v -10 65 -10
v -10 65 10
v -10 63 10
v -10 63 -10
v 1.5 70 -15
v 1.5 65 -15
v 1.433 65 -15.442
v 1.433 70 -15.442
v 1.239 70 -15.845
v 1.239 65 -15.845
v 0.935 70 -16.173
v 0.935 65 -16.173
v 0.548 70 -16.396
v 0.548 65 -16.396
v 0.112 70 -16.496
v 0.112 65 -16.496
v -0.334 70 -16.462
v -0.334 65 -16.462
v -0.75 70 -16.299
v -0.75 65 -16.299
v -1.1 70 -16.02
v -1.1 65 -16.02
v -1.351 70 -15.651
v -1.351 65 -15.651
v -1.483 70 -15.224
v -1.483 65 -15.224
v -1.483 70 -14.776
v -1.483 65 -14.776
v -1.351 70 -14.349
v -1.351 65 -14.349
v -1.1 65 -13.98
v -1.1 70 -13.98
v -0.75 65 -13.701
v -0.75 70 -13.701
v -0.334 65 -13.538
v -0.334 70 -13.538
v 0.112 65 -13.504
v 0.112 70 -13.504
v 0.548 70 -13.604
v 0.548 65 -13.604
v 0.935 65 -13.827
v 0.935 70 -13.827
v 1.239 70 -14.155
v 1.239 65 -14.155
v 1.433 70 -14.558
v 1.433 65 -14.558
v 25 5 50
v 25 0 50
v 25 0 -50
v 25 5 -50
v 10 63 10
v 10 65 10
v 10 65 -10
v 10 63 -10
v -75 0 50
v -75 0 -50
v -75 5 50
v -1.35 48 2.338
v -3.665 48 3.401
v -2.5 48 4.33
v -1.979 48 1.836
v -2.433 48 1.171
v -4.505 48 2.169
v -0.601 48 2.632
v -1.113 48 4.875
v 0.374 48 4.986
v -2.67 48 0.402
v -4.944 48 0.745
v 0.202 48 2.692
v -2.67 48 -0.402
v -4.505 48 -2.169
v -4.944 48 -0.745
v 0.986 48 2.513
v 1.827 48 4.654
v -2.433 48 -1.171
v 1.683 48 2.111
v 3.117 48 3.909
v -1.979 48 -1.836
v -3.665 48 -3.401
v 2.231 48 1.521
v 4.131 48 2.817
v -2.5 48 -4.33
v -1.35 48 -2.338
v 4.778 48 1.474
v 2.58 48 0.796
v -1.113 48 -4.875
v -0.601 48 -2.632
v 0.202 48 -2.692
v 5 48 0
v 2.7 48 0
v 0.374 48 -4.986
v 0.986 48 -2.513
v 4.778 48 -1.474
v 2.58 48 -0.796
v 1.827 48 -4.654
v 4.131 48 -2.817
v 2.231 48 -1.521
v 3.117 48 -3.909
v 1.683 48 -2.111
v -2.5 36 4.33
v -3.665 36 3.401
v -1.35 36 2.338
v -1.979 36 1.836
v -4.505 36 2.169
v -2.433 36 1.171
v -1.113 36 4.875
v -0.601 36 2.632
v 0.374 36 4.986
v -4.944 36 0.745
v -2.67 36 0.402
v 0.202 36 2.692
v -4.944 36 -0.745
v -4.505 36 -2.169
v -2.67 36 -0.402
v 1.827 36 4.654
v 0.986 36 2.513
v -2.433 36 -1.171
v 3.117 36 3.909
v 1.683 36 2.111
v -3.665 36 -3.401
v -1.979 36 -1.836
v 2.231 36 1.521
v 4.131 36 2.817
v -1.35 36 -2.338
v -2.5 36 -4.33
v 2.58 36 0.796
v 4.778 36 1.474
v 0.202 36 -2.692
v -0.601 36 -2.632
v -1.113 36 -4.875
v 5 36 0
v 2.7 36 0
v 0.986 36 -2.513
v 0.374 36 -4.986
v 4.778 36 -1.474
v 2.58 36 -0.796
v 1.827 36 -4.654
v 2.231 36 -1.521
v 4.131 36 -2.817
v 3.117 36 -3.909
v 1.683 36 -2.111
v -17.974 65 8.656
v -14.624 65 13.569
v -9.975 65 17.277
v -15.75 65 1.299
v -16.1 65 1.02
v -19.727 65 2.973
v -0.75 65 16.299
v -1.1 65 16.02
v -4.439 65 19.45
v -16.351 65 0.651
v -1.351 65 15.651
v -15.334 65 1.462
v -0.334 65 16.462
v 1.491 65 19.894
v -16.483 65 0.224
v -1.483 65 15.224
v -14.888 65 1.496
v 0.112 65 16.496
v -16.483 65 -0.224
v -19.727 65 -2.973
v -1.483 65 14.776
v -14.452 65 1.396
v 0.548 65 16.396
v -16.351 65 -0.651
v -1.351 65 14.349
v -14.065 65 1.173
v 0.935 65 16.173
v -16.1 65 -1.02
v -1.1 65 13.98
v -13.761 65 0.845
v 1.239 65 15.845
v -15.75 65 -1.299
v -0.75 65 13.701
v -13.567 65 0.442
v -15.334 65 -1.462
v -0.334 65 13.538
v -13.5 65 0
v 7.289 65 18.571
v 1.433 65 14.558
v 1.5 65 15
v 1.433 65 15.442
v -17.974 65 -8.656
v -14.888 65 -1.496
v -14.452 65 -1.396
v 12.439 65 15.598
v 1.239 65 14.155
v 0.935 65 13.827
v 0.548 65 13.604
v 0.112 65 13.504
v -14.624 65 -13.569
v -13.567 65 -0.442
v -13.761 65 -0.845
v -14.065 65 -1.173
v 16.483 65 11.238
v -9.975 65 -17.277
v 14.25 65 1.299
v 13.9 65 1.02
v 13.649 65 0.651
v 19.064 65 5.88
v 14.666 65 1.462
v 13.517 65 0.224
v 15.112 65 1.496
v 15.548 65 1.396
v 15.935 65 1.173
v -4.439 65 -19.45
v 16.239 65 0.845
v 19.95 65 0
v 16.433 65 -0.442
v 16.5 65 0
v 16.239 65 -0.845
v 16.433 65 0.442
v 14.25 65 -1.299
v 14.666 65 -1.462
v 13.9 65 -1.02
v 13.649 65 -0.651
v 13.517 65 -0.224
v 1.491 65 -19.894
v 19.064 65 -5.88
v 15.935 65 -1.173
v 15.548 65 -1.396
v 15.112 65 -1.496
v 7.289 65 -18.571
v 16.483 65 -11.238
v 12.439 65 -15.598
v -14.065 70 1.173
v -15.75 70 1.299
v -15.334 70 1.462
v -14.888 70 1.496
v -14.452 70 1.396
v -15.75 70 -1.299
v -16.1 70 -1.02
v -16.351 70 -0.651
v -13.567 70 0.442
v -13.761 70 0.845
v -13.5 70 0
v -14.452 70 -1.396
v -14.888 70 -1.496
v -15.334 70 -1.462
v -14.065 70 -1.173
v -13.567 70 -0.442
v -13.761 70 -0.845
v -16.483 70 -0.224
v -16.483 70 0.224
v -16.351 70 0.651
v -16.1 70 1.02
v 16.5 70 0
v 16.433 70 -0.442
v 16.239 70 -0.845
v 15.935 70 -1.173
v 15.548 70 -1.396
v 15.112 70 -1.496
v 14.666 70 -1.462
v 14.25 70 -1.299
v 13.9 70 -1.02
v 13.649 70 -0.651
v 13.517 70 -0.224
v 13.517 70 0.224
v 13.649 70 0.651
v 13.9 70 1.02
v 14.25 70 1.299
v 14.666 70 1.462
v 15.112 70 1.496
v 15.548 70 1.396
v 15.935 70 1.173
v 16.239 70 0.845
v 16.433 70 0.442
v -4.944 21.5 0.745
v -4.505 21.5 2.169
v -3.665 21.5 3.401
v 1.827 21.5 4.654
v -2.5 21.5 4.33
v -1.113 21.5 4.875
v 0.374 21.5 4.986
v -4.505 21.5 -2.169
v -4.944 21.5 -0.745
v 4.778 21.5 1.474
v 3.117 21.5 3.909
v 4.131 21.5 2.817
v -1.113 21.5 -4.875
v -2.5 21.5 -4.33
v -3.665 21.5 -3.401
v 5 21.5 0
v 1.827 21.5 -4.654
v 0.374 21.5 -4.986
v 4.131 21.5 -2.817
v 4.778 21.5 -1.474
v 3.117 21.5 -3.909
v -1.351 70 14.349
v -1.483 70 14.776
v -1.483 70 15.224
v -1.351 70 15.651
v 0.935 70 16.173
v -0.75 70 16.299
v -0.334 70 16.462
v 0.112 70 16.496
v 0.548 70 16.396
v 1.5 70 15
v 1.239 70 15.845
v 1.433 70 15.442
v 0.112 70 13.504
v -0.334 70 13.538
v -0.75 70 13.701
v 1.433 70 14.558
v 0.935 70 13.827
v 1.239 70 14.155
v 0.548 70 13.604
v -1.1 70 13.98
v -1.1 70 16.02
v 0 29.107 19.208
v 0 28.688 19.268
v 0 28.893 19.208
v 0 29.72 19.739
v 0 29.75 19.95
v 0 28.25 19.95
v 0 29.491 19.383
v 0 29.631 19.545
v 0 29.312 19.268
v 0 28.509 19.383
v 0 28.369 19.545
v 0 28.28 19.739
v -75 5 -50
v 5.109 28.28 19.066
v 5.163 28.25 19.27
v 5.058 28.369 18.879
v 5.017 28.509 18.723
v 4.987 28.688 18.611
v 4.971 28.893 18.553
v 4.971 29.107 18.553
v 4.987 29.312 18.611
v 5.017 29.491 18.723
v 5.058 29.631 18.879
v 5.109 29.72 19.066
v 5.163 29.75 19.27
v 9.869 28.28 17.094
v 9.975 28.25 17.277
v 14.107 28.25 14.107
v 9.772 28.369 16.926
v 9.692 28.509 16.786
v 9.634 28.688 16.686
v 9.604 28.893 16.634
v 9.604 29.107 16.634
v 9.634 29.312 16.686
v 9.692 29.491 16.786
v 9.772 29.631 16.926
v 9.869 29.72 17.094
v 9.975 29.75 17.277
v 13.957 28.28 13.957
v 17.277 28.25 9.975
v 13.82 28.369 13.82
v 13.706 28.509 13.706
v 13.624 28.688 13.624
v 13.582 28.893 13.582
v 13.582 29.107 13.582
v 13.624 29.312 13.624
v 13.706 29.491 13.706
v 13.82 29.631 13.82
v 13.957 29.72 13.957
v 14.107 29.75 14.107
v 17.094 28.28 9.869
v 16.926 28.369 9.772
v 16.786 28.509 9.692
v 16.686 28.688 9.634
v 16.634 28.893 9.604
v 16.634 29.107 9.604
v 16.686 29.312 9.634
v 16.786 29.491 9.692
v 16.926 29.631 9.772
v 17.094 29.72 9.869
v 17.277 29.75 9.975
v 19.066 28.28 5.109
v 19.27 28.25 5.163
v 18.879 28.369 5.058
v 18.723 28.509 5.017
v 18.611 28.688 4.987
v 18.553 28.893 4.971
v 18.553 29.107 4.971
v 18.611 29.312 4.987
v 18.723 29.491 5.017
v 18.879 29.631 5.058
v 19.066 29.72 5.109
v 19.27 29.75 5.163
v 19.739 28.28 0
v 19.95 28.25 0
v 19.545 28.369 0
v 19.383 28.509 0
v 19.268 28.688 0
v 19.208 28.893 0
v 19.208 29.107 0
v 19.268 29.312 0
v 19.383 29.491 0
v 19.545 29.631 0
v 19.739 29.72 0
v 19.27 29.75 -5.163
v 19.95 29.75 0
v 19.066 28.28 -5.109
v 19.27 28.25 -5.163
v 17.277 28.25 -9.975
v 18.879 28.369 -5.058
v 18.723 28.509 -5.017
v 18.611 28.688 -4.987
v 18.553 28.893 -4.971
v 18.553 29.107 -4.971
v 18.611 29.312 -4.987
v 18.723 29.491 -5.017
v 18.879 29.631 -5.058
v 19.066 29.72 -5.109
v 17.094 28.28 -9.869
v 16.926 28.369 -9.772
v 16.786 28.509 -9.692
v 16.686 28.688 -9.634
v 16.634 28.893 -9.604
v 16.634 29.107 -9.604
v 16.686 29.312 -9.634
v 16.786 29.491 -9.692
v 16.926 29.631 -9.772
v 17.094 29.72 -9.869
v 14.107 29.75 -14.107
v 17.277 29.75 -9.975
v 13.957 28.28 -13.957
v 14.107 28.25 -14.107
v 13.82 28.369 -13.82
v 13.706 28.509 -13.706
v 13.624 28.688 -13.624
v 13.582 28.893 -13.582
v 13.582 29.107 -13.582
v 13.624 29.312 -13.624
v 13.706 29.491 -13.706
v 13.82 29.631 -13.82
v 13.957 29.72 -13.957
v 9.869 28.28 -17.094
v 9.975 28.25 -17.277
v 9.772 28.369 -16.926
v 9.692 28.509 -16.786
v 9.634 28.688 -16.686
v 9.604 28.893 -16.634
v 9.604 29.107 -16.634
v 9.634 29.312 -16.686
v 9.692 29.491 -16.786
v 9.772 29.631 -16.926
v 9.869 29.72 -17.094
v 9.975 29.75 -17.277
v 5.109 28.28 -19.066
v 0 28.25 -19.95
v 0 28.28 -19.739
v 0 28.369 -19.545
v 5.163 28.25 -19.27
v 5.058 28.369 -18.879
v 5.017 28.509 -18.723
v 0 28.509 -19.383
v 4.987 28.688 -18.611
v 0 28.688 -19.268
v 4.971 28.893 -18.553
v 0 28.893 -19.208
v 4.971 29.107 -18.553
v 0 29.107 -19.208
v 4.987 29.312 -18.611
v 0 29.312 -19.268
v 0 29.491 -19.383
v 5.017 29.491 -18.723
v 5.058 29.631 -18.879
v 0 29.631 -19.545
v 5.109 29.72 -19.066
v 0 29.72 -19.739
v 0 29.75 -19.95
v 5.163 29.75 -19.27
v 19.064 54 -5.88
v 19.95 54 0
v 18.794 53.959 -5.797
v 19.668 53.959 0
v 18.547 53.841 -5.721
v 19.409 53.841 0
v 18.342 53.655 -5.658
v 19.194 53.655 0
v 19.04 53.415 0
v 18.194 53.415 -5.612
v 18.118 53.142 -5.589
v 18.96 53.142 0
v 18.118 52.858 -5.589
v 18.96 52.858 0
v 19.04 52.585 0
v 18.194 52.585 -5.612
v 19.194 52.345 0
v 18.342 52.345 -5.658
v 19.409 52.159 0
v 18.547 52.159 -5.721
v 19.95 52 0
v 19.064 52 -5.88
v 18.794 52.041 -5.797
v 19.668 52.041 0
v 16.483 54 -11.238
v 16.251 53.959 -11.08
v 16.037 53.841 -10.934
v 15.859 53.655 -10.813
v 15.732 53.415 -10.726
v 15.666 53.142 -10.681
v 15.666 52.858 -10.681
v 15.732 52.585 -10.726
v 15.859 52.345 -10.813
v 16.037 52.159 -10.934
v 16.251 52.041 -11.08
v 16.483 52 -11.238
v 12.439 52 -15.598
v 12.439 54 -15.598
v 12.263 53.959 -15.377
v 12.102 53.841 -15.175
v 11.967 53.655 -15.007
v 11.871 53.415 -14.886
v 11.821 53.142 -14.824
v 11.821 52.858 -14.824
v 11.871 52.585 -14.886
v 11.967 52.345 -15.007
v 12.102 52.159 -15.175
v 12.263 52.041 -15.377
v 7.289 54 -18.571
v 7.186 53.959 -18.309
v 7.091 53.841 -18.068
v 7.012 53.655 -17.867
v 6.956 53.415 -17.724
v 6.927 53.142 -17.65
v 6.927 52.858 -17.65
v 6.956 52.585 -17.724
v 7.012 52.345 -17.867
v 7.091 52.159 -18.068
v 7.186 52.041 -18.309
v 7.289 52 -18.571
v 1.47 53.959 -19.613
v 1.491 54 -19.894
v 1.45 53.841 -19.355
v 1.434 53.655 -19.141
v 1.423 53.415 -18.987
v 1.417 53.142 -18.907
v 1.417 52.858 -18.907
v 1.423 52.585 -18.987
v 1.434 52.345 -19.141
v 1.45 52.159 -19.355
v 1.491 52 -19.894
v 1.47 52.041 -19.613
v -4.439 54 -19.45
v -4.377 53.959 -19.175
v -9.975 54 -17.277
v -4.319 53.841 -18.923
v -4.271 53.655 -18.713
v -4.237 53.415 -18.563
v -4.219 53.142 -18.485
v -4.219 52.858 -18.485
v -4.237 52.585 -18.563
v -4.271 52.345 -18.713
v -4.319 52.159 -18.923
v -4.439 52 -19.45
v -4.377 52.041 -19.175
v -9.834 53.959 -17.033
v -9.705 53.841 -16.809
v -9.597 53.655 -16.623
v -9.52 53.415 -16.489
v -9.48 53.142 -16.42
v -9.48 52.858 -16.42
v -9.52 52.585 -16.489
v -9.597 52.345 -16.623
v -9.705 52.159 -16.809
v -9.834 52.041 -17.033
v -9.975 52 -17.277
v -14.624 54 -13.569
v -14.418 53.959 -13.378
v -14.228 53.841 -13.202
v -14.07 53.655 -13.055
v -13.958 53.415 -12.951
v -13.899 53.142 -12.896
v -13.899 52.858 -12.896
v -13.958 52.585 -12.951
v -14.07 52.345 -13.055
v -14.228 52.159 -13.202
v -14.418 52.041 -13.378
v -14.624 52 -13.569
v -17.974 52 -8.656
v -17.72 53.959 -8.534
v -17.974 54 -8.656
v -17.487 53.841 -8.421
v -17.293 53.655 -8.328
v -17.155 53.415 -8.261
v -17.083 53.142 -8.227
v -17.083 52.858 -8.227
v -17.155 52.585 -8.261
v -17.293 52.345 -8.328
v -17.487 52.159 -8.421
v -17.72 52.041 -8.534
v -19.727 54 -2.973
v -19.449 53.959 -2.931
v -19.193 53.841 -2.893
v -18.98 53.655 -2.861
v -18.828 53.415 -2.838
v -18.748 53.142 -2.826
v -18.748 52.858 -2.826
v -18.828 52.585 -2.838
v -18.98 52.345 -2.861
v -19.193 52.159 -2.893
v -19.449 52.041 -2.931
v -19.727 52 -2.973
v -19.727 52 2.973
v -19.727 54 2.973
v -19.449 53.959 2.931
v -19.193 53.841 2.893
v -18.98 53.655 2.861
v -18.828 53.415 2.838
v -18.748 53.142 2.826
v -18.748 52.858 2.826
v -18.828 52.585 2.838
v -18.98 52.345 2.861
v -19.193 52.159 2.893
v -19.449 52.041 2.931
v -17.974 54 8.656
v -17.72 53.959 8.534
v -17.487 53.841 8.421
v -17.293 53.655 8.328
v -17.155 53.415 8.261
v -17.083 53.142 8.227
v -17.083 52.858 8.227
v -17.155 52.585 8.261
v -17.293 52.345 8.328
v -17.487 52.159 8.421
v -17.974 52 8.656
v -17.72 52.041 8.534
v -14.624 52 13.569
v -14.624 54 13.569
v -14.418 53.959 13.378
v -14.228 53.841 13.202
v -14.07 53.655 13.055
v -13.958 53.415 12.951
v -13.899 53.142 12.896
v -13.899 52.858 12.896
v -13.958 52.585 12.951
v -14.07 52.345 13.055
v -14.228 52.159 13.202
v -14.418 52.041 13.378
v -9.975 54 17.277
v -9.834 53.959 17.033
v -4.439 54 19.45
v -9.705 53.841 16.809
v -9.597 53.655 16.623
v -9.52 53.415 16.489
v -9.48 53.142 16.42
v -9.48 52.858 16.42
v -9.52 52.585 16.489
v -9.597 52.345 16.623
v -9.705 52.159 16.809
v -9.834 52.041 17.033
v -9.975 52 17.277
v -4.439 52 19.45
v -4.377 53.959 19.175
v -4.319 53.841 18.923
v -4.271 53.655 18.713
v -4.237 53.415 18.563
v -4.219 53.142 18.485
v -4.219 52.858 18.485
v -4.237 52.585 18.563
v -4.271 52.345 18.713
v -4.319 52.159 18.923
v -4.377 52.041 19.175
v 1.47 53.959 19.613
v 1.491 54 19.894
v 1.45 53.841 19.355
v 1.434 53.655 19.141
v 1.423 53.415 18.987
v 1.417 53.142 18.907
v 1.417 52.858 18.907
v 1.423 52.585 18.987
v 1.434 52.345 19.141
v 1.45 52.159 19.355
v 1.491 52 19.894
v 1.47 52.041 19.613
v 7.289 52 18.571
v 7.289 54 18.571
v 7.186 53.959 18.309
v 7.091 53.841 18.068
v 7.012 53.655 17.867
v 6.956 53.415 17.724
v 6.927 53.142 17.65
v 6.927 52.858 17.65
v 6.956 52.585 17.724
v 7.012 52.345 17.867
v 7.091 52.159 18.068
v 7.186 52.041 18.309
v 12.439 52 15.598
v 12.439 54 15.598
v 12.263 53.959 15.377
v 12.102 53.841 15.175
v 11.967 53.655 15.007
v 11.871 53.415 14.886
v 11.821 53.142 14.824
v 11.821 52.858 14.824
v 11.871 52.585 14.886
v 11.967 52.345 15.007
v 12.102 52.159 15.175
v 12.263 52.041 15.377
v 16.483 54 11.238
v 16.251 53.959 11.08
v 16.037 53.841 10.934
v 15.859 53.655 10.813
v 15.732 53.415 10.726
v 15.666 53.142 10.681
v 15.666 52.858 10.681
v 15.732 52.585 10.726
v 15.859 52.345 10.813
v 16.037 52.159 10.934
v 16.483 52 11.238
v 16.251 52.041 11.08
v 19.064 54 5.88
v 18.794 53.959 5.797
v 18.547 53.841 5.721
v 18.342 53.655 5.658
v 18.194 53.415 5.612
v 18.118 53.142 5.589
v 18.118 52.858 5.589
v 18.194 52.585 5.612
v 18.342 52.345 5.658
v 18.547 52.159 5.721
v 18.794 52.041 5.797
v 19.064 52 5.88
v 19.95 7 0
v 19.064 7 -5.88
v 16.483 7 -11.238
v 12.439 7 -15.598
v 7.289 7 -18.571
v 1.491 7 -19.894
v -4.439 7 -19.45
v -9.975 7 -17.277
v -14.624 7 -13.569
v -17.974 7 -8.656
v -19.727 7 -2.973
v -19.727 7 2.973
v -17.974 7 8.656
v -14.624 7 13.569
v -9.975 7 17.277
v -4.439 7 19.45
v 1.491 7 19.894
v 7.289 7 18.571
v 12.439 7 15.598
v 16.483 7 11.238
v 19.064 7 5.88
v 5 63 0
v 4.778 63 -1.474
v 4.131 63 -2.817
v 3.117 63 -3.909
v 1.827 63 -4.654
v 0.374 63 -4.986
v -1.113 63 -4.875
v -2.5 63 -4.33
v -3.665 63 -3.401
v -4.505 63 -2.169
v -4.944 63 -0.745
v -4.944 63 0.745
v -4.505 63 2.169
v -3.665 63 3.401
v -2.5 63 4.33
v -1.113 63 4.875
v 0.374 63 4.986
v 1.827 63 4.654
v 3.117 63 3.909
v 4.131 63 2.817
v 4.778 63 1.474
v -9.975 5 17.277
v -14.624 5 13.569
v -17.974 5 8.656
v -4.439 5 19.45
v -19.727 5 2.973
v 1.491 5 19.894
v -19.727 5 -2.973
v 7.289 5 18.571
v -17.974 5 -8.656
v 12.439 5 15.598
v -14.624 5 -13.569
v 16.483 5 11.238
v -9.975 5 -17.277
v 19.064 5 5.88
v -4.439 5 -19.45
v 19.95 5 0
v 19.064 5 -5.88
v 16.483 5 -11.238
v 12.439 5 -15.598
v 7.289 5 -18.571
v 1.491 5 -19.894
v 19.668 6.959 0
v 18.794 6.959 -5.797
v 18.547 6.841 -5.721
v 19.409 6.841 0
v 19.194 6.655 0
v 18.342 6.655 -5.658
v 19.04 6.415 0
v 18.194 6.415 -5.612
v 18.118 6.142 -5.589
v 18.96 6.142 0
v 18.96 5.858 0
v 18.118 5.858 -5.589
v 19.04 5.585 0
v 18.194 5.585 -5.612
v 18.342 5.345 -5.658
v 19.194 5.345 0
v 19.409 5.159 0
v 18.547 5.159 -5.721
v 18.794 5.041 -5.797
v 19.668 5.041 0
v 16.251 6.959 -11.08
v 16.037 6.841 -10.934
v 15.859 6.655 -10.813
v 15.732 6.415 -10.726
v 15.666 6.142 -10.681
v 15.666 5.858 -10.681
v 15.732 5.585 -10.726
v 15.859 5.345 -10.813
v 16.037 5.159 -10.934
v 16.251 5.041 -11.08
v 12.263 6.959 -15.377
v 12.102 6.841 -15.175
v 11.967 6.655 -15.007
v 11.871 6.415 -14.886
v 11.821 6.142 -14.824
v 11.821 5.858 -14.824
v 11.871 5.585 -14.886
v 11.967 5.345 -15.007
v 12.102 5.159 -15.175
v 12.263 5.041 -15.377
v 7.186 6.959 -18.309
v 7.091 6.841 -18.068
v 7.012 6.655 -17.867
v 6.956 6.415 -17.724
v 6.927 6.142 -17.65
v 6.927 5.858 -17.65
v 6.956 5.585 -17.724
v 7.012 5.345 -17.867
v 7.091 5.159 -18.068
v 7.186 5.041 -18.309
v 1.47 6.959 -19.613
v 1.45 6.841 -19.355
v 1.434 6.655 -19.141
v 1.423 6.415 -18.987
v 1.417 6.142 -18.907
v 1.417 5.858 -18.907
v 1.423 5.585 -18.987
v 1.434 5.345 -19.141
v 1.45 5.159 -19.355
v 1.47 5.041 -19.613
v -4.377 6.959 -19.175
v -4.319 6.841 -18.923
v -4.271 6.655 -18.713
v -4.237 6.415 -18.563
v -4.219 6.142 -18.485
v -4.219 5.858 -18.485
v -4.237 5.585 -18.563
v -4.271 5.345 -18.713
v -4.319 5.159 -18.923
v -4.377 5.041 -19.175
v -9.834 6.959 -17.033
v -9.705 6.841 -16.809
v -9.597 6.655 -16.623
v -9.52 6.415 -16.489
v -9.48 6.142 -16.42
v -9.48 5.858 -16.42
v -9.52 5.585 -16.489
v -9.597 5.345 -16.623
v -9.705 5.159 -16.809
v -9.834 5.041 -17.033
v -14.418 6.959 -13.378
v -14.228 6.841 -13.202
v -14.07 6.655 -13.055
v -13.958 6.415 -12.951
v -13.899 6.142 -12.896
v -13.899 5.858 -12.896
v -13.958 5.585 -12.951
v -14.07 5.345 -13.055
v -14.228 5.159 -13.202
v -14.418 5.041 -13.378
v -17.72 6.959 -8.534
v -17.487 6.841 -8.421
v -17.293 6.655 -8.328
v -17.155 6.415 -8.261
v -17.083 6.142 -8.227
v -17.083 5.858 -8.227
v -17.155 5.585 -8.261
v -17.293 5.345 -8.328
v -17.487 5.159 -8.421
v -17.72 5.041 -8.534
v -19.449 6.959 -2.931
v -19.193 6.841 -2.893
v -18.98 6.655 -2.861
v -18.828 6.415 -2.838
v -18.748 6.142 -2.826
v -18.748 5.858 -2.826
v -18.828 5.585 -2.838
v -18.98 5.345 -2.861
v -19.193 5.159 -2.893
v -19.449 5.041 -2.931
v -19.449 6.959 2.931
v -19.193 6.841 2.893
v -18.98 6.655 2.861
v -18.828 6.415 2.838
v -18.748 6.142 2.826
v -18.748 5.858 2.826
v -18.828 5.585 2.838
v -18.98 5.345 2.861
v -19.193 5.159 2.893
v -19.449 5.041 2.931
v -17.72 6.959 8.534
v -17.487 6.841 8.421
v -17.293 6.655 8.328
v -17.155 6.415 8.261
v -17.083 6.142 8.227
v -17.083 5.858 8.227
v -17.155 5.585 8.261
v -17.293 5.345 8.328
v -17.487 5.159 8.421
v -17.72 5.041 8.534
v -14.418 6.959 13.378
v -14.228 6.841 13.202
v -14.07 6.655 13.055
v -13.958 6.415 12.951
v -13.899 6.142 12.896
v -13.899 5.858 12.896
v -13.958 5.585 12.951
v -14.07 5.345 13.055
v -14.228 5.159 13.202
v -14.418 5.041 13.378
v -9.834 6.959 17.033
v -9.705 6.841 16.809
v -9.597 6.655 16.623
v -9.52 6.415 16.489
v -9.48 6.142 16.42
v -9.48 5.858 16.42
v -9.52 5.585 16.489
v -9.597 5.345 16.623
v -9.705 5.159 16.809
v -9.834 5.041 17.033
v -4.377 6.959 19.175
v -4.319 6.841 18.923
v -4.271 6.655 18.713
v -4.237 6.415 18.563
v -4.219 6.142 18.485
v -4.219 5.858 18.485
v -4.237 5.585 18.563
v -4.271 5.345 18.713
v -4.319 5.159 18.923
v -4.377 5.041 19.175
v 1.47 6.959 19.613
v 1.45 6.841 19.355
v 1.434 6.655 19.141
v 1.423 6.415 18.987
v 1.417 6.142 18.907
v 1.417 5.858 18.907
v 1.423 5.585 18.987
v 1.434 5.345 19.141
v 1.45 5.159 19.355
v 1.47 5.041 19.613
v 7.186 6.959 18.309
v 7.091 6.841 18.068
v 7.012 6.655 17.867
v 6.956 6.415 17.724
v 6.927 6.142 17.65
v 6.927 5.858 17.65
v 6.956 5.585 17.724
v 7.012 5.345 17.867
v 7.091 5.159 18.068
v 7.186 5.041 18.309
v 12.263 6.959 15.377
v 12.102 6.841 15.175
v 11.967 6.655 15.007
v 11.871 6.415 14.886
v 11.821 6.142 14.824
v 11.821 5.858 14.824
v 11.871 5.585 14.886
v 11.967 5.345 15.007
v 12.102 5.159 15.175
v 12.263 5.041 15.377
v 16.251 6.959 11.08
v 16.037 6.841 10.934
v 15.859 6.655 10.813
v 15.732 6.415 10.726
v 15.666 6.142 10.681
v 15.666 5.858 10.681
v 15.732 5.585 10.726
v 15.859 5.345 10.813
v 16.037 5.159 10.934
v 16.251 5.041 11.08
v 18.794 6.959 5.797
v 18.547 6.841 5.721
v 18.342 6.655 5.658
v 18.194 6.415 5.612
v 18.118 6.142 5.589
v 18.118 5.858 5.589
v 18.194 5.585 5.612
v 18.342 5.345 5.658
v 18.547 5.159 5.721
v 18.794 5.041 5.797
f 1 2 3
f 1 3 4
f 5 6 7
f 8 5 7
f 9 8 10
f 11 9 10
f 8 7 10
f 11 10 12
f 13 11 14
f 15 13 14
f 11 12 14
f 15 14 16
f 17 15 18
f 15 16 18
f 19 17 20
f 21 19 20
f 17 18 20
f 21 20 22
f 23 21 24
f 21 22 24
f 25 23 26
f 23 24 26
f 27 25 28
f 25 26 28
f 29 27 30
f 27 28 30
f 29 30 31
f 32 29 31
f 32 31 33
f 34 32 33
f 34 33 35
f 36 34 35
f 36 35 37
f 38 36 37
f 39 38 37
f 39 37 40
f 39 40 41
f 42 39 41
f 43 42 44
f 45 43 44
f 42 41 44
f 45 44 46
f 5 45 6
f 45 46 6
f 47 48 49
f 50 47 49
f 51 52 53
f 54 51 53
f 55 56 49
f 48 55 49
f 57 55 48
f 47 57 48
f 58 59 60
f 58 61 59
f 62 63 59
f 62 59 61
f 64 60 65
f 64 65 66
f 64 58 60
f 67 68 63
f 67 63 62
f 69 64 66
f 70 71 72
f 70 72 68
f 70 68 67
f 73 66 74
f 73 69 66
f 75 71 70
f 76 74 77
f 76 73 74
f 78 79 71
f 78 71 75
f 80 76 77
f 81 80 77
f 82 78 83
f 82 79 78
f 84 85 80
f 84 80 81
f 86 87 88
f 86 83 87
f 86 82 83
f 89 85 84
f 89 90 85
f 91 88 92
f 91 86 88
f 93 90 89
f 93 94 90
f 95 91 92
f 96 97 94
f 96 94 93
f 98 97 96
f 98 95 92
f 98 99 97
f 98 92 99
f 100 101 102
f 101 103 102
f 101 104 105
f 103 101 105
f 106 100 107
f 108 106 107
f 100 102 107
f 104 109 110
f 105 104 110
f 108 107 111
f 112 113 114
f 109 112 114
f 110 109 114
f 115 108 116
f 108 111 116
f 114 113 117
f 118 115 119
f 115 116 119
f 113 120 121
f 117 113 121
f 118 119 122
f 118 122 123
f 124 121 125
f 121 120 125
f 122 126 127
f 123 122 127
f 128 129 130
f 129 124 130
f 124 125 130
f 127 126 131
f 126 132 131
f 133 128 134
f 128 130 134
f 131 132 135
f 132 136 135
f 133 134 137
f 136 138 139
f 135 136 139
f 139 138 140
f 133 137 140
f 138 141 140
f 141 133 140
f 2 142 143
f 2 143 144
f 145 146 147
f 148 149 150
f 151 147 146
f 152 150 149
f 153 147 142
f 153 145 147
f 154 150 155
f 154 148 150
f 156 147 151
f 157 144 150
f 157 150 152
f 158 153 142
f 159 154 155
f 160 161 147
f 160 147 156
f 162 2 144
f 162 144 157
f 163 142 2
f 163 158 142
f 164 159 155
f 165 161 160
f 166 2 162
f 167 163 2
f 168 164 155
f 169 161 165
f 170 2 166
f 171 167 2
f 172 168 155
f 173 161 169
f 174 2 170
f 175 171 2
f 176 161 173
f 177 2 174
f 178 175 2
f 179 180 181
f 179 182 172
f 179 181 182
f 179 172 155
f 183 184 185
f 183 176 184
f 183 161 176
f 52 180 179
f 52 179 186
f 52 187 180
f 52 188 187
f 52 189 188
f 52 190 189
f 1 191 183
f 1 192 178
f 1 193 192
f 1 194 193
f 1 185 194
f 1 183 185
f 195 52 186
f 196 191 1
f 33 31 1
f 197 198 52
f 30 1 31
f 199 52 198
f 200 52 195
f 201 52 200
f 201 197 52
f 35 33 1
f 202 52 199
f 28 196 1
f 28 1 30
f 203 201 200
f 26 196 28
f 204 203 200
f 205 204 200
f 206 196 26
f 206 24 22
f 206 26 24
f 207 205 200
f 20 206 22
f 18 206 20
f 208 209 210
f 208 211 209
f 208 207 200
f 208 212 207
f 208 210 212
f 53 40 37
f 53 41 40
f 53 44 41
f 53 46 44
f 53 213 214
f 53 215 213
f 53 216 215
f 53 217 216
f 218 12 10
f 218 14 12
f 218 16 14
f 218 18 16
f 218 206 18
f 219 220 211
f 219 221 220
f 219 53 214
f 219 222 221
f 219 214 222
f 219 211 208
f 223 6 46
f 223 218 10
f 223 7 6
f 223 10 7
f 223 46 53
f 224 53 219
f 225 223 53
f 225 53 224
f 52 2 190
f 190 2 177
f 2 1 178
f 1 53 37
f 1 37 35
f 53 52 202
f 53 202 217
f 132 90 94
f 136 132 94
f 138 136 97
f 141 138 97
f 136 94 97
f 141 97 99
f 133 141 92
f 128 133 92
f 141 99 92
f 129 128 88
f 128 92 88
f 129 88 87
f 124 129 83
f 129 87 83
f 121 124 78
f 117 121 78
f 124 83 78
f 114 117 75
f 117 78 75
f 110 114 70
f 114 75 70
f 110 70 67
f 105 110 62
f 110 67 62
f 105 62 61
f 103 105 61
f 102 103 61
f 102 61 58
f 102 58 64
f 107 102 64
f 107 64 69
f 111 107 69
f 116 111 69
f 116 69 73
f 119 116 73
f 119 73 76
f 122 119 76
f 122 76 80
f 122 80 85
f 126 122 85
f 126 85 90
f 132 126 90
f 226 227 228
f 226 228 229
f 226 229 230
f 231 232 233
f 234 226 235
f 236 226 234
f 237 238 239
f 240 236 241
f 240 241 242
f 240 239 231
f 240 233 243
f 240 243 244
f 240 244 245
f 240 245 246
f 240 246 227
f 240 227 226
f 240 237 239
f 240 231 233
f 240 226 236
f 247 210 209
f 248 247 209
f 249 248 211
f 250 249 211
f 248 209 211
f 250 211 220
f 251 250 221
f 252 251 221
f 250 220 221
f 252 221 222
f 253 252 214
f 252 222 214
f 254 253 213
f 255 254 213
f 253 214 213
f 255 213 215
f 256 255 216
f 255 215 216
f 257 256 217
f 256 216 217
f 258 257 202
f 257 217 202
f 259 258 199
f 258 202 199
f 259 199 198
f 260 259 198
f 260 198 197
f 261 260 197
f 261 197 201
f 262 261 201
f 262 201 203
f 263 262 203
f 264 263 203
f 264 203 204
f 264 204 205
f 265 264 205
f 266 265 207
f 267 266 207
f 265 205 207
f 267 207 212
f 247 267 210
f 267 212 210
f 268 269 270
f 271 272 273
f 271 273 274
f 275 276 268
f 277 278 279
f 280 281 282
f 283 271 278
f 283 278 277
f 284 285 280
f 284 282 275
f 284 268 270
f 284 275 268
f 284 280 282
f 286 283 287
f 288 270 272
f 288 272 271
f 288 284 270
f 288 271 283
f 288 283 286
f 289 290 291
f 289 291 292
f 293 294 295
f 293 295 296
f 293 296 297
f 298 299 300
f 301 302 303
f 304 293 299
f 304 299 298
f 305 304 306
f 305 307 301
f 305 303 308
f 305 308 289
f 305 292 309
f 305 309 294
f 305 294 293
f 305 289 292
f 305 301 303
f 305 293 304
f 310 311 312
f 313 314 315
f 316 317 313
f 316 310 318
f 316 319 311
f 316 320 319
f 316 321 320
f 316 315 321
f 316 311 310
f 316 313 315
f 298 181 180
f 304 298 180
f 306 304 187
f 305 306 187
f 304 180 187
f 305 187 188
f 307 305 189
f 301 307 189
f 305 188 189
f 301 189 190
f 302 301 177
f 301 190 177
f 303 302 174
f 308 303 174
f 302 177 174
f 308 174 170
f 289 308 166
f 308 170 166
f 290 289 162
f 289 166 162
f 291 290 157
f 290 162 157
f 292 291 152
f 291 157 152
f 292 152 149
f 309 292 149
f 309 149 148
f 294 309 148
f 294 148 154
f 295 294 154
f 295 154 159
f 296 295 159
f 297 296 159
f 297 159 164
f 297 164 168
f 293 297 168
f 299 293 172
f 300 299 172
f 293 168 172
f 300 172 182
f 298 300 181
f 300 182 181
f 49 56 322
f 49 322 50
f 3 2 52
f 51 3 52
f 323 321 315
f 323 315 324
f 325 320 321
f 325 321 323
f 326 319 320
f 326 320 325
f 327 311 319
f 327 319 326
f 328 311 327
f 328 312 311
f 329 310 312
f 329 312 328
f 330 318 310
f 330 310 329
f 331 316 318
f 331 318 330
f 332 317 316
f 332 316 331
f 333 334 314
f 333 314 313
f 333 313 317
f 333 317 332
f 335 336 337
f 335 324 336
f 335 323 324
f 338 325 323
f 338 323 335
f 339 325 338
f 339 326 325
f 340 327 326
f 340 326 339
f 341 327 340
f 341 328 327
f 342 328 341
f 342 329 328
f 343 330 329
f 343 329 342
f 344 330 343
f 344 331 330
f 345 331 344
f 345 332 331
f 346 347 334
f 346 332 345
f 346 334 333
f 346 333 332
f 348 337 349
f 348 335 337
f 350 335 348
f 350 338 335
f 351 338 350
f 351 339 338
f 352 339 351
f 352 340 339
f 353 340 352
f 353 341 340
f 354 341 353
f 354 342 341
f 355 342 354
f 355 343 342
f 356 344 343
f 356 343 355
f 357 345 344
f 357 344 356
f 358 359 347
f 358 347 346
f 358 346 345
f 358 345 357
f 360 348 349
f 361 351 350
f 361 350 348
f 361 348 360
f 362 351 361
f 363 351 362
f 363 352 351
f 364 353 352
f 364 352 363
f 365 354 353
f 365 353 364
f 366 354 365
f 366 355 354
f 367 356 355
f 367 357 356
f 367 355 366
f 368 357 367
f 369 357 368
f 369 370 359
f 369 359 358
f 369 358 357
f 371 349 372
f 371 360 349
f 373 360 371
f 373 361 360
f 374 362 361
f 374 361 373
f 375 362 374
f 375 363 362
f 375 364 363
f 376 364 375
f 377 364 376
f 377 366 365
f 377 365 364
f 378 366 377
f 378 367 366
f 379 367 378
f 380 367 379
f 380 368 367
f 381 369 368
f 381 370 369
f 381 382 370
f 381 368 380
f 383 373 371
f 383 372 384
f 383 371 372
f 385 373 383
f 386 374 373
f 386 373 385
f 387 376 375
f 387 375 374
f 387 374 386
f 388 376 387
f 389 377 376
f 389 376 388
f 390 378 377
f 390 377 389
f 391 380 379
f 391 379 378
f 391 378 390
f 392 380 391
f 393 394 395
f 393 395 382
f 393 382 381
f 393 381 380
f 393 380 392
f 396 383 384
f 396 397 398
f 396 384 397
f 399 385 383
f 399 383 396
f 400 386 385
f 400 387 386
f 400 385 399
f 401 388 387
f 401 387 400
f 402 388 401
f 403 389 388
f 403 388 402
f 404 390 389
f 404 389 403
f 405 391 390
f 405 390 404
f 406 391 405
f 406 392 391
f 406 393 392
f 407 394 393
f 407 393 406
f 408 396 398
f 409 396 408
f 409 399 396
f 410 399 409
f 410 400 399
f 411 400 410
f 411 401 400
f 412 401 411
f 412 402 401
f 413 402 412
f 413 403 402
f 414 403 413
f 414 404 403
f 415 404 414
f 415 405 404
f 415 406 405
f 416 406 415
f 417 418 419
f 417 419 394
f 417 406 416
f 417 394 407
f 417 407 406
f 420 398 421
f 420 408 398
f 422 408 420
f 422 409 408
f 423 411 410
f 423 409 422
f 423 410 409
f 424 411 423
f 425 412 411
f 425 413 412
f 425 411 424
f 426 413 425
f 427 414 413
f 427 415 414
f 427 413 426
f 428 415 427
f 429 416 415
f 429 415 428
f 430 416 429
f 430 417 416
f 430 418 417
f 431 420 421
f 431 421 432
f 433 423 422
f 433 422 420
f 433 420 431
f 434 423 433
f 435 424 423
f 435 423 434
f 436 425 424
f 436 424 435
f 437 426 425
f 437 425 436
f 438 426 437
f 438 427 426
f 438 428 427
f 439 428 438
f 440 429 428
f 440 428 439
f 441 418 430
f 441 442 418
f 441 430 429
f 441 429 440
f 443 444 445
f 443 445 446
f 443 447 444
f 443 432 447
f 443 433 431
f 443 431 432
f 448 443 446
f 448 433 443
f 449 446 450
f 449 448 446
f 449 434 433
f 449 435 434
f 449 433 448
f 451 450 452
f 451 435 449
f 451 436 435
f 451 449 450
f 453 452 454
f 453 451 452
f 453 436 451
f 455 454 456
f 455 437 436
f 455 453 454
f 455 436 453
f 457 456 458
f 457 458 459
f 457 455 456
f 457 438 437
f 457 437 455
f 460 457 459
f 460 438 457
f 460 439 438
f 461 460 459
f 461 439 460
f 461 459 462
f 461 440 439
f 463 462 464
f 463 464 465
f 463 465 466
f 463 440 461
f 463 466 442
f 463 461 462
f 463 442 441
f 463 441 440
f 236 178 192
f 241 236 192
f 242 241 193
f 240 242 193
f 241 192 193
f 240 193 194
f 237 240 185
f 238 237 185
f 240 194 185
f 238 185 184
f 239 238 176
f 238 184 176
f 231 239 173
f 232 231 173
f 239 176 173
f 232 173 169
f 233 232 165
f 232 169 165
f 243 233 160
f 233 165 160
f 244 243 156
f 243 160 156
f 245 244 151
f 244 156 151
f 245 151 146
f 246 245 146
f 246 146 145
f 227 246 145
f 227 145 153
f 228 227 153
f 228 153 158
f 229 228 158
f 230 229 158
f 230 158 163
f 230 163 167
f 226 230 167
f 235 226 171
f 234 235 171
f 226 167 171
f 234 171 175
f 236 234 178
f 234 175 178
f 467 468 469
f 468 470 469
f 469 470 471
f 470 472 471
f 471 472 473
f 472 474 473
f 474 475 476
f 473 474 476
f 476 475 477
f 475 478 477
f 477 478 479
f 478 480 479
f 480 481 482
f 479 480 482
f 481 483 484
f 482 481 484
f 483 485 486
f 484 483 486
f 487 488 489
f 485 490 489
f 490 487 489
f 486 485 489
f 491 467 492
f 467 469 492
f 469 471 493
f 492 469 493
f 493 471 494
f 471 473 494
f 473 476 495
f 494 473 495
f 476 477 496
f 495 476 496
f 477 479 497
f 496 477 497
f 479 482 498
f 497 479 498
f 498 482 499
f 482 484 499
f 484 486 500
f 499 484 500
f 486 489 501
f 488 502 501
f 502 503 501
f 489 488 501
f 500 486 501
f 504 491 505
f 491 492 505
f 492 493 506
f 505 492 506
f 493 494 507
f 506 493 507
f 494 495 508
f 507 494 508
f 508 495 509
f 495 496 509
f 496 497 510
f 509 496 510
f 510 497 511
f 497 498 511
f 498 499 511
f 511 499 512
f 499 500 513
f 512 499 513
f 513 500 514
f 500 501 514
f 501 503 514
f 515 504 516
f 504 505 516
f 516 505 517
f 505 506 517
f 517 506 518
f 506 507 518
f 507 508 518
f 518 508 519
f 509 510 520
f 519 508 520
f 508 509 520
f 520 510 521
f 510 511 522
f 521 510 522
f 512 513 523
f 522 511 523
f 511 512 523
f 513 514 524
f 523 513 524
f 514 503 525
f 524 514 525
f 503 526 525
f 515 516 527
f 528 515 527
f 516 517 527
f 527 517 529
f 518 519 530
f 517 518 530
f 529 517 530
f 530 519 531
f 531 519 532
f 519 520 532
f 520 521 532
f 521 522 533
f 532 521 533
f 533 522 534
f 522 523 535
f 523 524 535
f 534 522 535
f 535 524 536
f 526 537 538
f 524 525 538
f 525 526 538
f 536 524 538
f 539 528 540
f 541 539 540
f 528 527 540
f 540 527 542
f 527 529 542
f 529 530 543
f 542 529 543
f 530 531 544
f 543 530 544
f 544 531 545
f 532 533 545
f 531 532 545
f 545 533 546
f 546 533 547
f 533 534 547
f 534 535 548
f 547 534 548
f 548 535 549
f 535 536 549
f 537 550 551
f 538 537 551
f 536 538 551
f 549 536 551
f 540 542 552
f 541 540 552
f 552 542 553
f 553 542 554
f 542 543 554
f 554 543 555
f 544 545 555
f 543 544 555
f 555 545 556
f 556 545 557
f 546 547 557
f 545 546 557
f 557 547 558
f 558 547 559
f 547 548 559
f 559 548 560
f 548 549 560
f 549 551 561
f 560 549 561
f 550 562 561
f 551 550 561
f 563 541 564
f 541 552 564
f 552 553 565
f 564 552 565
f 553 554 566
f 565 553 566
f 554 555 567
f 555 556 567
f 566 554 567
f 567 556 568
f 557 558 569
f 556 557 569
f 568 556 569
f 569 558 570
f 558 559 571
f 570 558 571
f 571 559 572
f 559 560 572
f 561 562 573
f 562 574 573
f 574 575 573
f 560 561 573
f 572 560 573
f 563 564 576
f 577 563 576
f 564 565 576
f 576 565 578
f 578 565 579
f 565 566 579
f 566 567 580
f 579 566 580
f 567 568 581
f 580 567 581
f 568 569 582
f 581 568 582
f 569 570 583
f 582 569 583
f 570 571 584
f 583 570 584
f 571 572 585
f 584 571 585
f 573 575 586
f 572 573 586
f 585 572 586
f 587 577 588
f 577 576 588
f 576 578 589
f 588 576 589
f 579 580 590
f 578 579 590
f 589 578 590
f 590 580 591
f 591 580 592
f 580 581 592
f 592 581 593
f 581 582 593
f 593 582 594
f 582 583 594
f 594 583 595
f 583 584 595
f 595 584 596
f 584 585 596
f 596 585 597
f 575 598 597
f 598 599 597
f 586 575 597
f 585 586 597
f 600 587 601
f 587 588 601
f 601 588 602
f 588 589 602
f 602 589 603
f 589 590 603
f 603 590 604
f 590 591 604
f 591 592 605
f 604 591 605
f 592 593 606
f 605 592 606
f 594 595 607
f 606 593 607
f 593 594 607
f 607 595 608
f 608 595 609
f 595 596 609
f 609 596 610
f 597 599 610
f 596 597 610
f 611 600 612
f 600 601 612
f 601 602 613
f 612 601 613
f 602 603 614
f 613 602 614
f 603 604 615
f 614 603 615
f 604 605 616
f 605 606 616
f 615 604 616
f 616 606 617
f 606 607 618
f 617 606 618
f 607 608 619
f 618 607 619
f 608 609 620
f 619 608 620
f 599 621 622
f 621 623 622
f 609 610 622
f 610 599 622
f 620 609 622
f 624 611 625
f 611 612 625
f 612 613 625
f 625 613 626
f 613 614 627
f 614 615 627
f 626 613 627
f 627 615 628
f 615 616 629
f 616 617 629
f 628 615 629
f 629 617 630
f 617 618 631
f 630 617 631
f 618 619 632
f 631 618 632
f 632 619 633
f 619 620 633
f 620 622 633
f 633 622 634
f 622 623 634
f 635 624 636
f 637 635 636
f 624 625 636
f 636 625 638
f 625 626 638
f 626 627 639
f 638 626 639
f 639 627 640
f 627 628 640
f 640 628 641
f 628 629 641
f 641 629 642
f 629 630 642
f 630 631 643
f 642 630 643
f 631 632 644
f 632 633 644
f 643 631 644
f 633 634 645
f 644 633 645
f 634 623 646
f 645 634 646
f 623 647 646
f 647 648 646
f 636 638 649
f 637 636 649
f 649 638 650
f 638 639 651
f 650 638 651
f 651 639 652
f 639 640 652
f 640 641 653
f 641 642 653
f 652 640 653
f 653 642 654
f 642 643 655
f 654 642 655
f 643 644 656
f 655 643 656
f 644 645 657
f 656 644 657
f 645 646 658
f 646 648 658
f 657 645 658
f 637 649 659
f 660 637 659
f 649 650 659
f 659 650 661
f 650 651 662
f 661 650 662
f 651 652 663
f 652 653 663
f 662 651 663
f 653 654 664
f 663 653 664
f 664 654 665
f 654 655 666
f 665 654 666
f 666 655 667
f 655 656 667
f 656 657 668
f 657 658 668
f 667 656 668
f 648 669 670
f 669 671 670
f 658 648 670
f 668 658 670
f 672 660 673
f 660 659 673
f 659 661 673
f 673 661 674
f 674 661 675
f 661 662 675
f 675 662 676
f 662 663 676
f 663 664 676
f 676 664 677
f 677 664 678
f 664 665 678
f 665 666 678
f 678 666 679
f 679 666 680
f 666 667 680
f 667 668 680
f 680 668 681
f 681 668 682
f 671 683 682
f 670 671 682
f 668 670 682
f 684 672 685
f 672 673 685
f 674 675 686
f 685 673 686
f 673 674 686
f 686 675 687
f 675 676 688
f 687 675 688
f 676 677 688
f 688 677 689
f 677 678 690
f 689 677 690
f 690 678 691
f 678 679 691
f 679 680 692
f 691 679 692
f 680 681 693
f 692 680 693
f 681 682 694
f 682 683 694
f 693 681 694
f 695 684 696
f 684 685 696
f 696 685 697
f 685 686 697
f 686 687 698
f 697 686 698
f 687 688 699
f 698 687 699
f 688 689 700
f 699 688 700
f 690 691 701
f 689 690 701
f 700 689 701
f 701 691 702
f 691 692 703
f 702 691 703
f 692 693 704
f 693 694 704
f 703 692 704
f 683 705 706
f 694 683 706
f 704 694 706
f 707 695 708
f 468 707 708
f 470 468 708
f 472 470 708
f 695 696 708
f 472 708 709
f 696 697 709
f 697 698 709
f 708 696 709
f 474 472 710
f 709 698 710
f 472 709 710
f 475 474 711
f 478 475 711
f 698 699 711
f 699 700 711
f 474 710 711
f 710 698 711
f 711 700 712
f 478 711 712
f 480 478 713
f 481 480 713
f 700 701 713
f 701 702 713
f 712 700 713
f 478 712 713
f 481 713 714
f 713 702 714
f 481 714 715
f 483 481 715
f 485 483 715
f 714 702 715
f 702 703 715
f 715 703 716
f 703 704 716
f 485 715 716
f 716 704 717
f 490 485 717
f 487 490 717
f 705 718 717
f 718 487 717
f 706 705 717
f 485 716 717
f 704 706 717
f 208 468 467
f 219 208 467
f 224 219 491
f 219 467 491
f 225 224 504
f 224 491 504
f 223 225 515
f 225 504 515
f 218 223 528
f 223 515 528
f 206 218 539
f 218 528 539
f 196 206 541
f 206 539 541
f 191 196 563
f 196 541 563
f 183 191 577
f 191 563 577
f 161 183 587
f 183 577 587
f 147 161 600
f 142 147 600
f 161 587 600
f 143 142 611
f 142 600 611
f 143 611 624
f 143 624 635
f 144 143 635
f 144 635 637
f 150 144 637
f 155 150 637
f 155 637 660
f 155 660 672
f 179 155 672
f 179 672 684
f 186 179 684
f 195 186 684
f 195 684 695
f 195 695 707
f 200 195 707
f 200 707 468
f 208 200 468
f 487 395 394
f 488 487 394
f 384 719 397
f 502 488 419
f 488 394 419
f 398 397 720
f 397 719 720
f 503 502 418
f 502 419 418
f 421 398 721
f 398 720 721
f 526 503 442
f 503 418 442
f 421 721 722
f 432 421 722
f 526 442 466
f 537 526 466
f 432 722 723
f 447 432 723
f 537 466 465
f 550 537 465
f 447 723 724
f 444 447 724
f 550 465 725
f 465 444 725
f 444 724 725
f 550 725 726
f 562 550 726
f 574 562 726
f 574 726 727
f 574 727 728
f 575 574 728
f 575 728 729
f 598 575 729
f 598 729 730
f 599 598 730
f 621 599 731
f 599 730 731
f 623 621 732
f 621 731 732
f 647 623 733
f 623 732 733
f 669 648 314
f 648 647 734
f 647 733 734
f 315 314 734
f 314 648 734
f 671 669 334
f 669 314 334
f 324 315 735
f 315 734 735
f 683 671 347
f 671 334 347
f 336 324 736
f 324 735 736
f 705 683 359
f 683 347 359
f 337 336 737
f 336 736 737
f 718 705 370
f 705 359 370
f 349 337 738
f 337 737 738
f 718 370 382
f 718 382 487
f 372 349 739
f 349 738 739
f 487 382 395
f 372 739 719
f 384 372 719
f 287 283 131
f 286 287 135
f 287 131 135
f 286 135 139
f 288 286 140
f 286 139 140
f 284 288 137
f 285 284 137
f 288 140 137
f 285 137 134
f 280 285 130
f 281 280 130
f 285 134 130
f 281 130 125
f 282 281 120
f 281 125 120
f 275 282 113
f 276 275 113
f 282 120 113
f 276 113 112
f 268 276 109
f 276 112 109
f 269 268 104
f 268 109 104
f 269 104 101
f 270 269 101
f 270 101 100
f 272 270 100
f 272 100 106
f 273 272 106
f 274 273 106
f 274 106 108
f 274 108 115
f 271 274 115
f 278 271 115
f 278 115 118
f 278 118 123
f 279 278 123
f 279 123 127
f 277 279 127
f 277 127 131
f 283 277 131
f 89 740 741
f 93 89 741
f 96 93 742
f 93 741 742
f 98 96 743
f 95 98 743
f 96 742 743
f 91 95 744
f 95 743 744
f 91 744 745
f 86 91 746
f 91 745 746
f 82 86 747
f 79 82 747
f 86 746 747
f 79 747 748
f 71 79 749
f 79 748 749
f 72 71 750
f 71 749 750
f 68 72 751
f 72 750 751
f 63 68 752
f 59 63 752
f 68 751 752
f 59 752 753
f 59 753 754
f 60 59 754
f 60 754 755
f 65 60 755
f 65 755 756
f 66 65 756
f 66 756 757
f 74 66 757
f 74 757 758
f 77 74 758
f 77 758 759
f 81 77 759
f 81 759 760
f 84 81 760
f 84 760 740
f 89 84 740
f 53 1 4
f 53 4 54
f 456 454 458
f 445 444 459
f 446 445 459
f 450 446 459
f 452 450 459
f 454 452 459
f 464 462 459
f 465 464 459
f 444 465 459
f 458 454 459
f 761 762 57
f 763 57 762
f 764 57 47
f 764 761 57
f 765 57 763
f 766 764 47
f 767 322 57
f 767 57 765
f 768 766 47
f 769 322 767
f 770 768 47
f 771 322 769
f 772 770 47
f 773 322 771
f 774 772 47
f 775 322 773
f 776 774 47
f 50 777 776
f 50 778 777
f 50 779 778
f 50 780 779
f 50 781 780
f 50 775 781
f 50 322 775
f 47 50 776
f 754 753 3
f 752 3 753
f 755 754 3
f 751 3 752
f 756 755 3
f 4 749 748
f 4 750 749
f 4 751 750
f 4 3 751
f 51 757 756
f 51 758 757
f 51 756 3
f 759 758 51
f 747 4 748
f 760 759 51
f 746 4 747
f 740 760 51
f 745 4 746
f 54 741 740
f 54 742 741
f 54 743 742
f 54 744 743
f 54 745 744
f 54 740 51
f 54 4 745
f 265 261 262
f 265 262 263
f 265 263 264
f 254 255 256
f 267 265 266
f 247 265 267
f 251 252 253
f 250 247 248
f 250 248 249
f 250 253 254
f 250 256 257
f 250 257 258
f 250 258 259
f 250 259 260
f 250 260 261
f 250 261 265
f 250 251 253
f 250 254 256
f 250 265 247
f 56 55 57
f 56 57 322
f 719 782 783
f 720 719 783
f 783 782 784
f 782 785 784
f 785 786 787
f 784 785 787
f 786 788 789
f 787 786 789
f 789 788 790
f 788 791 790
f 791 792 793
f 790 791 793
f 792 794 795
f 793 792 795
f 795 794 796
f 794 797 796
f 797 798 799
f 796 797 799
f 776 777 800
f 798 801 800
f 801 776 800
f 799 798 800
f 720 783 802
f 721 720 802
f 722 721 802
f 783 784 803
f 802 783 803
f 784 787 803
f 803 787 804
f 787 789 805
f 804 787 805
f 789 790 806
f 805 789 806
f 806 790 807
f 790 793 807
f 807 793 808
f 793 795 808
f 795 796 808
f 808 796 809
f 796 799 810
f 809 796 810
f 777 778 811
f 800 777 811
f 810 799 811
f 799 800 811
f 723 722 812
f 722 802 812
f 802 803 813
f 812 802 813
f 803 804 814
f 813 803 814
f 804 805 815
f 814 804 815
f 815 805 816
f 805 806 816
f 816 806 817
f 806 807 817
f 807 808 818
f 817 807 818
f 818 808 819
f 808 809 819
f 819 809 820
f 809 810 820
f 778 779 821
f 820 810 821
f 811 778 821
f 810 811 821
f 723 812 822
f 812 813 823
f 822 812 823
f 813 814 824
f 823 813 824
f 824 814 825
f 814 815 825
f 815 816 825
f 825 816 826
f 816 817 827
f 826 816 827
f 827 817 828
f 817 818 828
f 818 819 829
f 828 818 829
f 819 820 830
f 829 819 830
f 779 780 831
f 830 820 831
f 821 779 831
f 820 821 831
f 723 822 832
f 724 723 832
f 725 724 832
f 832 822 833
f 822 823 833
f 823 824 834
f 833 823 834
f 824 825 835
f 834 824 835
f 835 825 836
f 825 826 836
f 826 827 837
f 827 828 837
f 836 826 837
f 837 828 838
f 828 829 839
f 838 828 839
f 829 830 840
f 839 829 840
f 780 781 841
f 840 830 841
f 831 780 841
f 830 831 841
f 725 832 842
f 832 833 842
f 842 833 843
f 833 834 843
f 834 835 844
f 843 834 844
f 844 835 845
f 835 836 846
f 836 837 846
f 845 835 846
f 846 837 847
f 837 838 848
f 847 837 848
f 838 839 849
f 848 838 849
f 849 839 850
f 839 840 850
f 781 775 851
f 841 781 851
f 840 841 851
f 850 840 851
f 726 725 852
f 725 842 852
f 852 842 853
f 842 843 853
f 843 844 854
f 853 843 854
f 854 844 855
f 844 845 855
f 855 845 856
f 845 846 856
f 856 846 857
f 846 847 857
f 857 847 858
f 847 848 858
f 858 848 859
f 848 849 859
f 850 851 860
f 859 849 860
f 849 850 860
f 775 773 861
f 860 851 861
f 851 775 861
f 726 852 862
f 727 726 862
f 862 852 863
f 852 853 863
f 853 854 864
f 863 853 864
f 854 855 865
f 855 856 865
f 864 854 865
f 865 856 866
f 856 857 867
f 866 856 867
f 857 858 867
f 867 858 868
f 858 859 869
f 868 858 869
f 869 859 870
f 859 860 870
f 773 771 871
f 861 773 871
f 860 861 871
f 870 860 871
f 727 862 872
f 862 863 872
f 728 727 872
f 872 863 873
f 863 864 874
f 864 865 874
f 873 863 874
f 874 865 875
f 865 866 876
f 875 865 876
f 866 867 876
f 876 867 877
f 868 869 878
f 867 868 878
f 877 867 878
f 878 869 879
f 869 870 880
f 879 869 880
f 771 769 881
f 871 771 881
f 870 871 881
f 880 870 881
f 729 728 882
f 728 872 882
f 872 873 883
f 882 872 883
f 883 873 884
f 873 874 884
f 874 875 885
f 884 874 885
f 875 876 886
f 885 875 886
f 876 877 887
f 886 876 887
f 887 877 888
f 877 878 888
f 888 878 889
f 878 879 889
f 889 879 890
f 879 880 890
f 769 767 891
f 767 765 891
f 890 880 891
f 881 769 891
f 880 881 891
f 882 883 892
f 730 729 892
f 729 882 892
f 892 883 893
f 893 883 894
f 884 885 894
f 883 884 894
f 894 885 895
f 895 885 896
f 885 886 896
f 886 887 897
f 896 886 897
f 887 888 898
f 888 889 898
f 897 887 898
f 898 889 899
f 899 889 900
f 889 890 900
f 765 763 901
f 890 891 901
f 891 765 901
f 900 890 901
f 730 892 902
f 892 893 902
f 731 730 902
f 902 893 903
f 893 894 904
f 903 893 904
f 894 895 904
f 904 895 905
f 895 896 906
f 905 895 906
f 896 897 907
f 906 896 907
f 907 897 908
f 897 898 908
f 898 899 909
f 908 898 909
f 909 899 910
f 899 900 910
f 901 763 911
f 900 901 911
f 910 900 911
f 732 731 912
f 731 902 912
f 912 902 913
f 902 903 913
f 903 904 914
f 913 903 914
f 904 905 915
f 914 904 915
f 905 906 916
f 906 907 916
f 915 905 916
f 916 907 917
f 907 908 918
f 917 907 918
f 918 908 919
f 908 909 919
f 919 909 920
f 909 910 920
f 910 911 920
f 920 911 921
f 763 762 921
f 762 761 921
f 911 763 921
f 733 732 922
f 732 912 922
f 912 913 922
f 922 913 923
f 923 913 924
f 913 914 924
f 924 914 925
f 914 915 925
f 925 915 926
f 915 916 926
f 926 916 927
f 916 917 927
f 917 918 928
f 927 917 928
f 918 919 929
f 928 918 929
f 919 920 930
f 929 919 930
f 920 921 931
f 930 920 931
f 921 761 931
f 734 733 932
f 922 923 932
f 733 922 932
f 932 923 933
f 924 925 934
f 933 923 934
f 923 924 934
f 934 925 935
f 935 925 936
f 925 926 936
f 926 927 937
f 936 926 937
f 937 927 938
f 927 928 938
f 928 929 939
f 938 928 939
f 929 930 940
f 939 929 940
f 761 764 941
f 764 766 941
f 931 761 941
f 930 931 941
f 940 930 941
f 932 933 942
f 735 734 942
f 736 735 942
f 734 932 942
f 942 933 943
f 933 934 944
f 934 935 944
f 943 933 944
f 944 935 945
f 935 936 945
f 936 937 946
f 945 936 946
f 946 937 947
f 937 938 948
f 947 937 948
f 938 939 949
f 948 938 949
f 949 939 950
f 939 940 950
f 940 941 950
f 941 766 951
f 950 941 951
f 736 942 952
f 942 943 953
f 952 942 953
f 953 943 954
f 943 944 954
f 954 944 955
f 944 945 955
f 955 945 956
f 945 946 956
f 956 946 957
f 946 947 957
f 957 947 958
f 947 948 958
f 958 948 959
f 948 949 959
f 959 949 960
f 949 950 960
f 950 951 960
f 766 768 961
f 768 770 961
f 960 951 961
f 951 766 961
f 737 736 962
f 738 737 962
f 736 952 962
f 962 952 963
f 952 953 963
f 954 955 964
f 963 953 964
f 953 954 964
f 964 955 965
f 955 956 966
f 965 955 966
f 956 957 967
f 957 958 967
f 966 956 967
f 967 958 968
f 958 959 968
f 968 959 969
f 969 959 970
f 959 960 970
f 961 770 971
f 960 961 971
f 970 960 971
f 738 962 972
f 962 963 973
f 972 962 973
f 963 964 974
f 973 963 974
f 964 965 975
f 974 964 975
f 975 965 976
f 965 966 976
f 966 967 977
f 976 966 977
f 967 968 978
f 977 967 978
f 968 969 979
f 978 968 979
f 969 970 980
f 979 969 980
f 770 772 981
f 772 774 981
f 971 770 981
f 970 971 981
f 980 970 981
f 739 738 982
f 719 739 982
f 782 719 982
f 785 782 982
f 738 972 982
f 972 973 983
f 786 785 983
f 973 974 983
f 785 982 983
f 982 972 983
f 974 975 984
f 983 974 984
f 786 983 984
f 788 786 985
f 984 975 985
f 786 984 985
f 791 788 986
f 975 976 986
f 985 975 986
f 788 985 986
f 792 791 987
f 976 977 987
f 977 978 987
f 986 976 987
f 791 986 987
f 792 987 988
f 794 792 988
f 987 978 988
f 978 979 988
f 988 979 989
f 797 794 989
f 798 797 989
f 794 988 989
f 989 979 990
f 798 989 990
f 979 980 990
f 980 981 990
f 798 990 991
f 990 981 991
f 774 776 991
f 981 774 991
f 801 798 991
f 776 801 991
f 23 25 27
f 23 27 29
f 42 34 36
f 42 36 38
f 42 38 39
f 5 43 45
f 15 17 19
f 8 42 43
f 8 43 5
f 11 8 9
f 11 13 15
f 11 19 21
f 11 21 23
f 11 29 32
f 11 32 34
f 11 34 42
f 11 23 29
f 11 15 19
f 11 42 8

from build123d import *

# Parameters (mm, degrees)
SKETCH2_W                = 100
SKETCH2_H                = 100
BOSS_EXTRUDE1_DEPTH      = 5
SKETCH3_R                = 19.95
BOSS_EXTRUDE2_DEPTH      = 60
SKETCH4_R                = 5
CUT_EXTRUDE1_DEPTH       = 43.5
SKETCH10_R               = 1
SKETCH11_R               = 1
SKETCH15_R               = 5
BOSS_EXTRUDE3_DEPTH      = 10
BOSS_EXTRUDE3_DEPTH_BACK = 2
SKETCH18_R               = 5
BOSS_EXTRUDE4_DEPTH      = 1
SKETCH19_R               = 2.7
CUT_EXTRUDE3_DEPTH       = 36
SKETCH20_R               = 0.75
CUT_REVOLVE4_ANGLE       = 180
SKETCH21_W               = 20
SKETCH21_H               = 20
CUT_EXTRUDE4_DEPTH       = 2
SKETCH23_R               = 1.5
BOSS_EXTRUDE5_DEPTH      = 5


with BuildPart() as part:
    # Sketch2 → Boss-Extrude1 (new body)
    with BuildSketch(Plane(origin=(0, 0, 0), x_dir=(1, 0, 0), z_dir=(0, 1, 0))):
        with Locations((-25, 0)):
            Rectangle(SKETCH2_W, SKETCH2_H)
    extrude(amount=BOSS_EXTRUDE1_DEPTH)

    # Sketch3 → Boss-Extrude2 (add)
    with BuildSketch(Plane(origin=(0, 5, 0), x_dir=(1, 0, 0), z_dir=(0, 1, 0))):
        Circle(SKETCH3_R)
    extrude(amount=BOSS_EXTRUDE2_DEPTH)

    # Sketch4 → Cut-Extrude1 (cut)
    with BuildSketch(Plane(origin=(0, 65, 0), x_dir=(1, 0, 0), z_dir=(0, 1, 0))):
        Circle(SKETCH4_R)
    extrude(amount=-CUT_EXTRUDE1_DEPTH, mode=Mode.SUBTRACT)

    # Sketch10 → Cut-Revolve2 (revolve, cut)
    with BuildSketch(Plane.XY):
        with Locations((19.95, 6)):
            Circle(SKETCH10_R)
    revolve(axis=Axis((0, 0, 0), (0, 1, 0)), mode=Mode.SUBTRACT)

    # Sketch11 → Cut-Revolve3 (revolve, cut)
    with BuildSketch(Plane.XY):
        with Locations((19.95, 53)):
            Circle(SKETCH11_R)
    revolve(axis=Axis((0, 0, 0), (0, 1, 0)), mode=Mode.SUBTRACT)

    # Sketch15 → Boss-Extrude3 (add, two sides)
    with BuildSketch(Plane(origin=(0, 38, 0), x_dir=(1, 0, 0), z_dir=(0, 1, 0))) as boss_extrude3_sk:
        Circle(SKETCH15_R)
    extrude(amount=BOSS_EXTRUDE3_DEPTH)
    extrude(boss_extrude3_sk.sketch, amount=-BOSS_EXTRUDE3_DEPTH_BACK)

    # Sketch18 → Boss-Extrude4 (add)
    with BuildSketch(Plane(origin=(0, 65, 0), x_dir=(1, 0, 0), z_dir=(0, 1, 0))):
        Circle(SKETCH18_R)
    extrude(amount=-BOSS_EXTRUDE4_DEPTH)

    # Sketch19 → Cut-Extrude3 (cut)
    with BuildSketch(Plane(origin=(0, 65, 0), x_dir=(1, 0, 0), z_dir=(0, 1, 0))):
        Circle(SKETCH19_R)
    extrude(amount=-CUT_EXTRUDE3_DEPTH, mode=Mode.SUBTRACT)

    # Sketch20 → Cut-Revolve4 (revolve, cut)
    with BuildSketch(Plane(origin=(0, 0, 0), x_dir=(0, 0, -1), z_dir=(1, 0, 0))):
        with Locations((-19.95, 29)):
            Circle(SKETCH20_R)
    revolve(axis=Axis((0, 0, 0), (0, 1, 0)), revolution_arc=CUT_REVOLVE4_ANGLE, mode=Mode.SUBTRACT)

    # Sketch21 → Cut-Extrude4 (cut)
    with BuildSketch(Plane(origin=(0, 65, 0), x_dir=(1, 0, 0), z_dir=(0, 1, 0))):
        Rectangle(SKETCH21_W, SKETCH21_H)
    extrude(amount=-CUT_EXTRUDE4_DEPTH, mode=Mode.SUBTRACT)

    # Sketch23 → Boss-Extrude5 (add)
    with BuildSketch(Plane(origin=(0, 65, 0), x_dir=(1, 0, 0), z_dir=(0, 1, 0))):
        with Locations((0, -15)):
            Circle(SKETCH23_R)
        with Locations((0, 15)):
            Circle(SKETCH23_R)
        with Locations((-15, 0)):
            Circle(SKETCH23_R)
        with Locations((15, 0)):
            Circle(SKETCH23_R)
    extrude(amount=BOSS_EXTRUDE5_DEPTH)


solid = part.part
